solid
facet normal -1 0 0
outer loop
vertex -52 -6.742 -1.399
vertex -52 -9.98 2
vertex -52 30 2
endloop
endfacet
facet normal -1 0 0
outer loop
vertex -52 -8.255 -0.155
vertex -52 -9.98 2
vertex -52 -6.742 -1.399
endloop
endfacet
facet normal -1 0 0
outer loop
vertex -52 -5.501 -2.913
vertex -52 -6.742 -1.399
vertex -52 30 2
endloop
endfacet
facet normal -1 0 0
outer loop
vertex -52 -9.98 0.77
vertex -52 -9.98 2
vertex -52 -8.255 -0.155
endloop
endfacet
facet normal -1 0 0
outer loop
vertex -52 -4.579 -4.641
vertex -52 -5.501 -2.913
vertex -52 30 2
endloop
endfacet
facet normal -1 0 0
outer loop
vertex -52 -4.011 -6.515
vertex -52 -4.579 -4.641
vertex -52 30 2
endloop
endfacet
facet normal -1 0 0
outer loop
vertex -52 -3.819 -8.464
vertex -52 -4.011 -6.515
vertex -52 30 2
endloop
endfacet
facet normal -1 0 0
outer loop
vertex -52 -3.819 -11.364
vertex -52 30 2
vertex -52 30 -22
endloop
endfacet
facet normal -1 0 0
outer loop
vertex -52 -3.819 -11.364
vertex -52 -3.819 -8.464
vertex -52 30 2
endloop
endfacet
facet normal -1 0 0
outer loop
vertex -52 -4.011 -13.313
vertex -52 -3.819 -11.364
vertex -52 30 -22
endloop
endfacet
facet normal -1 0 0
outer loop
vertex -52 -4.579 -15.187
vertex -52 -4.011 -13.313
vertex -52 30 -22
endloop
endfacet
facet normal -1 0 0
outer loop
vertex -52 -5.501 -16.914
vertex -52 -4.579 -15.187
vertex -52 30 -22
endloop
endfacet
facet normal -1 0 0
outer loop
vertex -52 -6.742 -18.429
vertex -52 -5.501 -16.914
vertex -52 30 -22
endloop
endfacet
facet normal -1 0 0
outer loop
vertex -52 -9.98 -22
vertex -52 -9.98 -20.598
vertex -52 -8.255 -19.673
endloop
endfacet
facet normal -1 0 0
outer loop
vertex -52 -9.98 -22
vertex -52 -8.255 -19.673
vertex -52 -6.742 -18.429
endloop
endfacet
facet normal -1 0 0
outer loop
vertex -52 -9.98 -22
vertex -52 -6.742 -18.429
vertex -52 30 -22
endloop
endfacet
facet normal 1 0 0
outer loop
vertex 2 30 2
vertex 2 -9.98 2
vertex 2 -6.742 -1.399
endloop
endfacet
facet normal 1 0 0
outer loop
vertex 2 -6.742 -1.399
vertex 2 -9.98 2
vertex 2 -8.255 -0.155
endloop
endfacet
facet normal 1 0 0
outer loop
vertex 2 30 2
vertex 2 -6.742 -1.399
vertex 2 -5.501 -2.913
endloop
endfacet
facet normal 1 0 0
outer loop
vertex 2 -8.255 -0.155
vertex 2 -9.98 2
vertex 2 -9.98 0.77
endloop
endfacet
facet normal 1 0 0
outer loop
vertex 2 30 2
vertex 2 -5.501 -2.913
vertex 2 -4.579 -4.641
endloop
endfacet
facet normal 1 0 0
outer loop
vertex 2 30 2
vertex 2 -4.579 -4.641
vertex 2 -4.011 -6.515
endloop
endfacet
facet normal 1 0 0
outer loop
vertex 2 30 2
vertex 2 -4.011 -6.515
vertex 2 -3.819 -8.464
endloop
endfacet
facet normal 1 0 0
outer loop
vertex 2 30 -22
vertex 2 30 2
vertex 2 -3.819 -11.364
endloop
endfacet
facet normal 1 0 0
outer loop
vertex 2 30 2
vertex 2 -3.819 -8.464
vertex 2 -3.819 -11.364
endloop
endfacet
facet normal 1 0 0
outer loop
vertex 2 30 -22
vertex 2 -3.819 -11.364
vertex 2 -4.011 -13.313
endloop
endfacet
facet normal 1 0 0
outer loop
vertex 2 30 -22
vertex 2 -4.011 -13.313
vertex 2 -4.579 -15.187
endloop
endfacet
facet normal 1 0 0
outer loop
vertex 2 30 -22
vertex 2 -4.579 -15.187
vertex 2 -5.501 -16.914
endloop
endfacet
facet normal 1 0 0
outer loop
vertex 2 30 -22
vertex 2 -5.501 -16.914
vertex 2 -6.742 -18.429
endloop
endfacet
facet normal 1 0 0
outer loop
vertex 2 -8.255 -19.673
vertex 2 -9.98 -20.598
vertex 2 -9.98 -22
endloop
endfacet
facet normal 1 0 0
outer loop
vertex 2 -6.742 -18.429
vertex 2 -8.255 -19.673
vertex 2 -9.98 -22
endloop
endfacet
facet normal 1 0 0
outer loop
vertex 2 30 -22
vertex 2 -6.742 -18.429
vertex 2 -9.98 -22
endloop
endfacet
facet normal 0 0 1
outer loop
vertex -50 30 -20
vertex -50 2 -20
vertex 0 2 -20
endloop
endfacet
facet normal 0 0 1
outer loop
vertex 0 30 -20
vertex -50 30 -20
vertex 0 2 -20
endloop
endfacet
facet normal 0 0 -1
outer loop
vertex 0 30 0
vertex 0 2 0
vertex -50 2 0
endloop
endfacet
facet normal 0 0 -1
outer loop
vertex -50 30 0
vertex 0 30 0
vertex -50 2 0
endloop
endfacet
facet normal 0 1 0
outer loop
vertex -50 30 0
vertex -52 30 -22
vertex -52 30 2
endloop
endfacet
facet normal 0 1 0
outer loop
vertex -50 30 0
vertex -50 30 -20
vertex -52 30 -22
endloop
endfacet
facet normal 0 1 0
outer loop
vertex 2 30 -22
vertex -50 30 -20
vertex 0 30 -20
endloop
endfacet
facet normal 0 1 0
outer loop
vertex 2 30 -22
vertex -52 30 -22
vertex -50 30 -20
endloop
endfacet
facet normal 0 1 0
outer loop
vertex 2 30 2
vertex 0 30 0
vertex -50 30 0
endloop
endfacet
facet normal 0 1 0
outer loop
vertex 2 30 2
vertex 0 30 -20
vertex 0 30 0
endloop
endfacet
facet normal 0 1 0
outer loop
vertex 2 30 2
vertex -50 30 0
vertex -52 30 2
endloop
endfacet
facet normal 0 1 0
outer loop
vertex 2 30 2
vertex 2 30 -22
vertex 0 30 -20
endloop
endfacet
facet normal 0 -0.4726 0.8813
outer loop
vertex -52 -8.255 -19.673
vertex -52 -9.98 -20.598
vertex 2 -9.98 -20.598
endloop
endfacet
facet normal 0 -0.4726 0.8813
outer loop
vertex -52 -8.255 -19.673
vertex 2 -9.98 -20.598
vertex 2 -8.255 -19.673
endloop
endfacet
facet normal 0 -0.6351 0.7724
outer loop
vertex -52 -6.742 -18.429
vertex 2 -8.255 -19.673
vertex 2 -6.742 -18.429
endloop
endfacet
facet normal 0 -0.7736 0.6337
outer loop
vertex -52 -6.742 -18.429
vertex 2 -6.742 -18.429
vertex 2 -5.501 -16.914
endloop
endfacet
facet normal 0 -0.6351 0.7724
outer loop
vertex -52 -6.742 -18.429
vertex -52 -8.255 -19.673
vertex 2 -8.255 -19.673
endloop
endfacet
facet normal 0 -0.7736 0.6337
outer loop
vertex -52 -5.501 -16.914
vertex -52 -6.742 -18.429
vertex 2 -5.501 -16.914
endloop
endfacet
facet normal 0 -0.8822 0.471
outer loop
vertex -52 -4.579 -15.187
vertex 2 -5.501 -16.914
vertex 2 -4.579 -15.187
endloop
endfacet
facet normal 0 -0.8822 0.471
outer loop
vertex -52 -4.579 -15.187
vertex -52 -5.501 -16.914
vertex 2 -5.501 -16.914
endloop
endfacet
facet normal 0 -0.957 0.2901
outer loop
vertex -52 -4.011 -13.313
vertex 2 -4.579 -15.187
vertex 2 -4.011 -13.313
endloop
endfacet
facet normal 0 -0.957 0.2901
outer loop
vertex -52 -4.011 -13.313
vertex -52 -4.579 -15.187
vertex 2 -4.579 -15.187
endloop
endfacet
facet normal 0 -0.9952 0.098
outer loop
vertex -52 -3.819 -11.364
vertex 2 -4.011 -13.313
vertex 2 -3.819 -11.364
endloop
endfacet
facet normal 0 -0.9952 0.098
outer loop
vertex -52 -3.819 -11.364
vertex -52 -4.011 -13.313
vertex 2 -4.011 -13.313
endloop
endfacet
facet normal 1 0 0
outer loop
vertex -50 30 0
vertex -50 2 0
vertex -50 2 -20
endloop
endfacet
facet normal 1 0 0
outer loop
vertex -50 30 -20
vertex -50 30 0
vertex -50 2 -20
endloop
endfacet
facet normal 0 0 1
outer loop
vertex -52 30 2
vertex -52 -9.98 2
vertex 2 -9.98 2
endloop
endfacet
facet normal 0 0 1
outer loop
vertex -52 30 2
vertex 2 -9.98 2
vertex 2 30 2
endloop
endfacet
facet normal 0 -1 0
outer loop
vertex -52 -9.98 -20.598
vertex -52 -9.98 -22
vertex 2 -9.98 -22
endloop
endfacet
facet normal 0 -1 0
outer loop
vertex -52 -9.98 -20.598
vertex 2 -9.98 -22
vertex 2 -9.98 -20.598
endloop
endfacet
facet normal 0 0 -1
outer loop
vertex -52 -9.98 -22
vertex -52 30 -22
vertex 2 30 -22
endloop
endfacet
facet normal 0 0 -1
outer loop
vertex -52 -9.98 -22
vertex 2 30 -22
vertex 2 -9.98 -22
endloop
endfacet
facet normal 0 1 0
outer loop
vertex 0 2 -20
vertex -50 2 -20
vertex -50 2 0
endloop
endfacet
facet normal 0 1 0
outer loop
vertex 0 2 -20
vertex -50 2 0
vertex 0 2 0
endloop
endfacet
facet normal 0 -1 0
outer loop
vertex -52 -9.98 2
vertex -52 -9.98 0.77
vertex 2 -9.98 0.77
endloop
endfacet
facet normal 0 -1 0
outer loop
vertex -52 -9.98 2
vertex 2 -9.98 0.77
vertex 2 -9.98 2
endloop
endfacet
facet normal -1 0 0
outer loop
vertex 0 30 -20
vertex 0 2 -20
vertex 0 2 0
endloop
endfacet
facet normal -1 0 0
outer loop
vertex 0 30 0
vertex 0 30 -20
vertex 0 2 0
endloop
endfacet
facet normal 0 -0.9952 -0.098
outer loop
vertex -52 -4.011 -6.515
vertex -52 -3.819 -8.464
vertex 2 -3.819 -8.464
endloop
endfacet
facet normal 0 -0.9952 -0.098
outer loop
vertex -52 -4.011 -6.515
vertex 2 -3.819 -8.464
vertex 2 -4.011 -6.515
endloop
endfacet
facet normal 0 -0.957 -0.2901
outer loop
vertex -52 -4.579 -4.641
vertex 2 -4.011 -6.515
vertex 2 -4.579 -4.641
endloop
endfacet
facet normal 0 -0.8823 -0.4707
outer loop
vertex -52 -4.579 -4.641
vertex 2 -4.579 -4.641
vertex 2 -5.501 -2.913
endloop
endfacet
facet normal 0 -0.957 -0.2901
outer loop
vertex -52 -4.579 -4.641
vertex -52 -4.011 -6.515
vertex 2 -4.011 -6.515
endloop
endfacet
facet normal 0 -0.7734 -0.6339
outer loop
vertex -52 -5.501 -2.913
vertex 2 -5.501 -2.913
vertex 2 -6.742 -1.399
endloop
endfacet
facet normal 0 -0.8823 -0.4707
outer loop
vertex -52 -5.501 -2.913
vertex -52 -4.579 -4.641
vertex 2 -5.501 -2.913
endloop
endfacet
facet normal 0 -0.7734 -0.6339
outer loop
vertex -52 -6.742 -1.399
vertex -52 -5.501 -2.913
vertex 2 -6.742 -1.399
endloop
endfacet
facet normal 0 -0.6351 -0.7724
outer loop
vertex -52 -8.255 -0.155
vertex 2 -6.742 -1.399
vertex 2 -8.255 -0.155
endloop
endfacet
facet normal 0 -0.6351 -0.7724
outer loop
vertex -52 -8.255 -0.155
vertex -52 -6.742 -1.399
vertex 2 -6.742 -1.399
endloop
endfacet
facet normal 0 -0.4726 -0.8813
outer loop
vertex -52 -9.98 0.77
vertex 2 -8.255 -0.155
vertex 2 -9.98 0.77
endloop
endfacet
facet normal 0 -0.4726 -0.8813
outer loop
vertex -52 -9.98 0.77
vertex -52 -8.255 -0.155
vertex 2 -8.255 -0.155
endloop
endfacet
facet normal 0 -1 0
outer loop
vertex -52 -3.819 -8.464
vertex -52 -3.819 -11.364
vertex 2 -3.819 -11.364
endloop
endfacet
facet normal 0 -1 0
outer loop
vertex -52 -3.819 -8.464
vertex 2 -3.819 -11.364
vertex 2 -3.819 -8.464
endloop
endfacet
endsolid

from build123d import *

# Parameters (mm, degrees)
SURFACE_EXTRUSION1_1_DEPTH = 30
EPAISSIR1_T1               = 2
EPAISSIR2_OUTLINE_W        = 50
EPAISSIR2_OUTLINE_H        = 20
EPAISSIR2_DEPTH            = 2
BOSS_EXTRU_1_DEPTH         = 54
CONG_1_R                   = 10


# Read off the part's stored shape, not the designer's step: Epaissir2
with BuildPart() as body_1:
    # Surface-Extrusion1: a surface, the sketch's curves swept straight by 30 mm
    with BuildLine(Plane(origin=(0, 0, 0), x_dir=(1, 0, 0), z_dir=(0, 1, 0)), mode=Mode.PRIVATE) as surface_extrusion1_1_path:
        Line((0, 0), (-50, 0))
        Line((-50, 0), (-50, 20))
        Line((-50, 20), (0, 20))
        Line((0, 20), (0, 0))
    surface_extrusion1_1 = Shell.extrude(surface_extrusion1_1_path.wire(), (0 * SURFACE_EXTRUSION1_1_DEPTH, 1 * SURFACE_EXTRUSION1_1_DEPTH, 0 * SURFACE_EXTRUSION1_1_DEPTH))
    add(Solid.thicken(surface_extrusion1_1, EPAISSIR1_T1))

    # Epaissir2 outline → Epaissir2 (add)
    with BuildSketch(Plane(origin=(0, 0, 0), x_dir=(1, 0, 0), z_dir=(0, 1, 0))):
        with Locations((-25, 10)):
            Rectangle(EPAISSIR2_OUTLINE_W, EPAISSIR2_OUTLINE_H)
    extrude(amount=EPAISSIR2_DEPTH)

    # Esquisse3 → Boss.-Extru.1 (add)
    with BuildSketch(Plane.ZY.offset(52)):
        Polygon((-22, 0), (-22, -9.980445305), (-20.597715591, -9.980445305), (-20.597715591, -3.819178115), (0.770065176, -3.819178115), (0.770065176, -9.980445305), (2, -9.980445305), (2, 0), align=None)
    extrude(amount=-BOSS_EXTRU_1_DEPTH)

    # Congé1
    # the kernel refuses this fillet: 10 mm, written as the material it adds along each edge
    with BuildSketch(Plane(origin=(-52, -3.819178115, 0.770065176), x_dir=(0, -1, 0), z_dir=(1, 0, 0))) as cong_1_piece_1:
        with BuildLine():
            CenterArc((10, 9.233857829), CONG_1_R, 180, 67.426190035)
            Line((0, 9.233857829), (-0.2, 9.233857829))
            Line((-0.2, 9.233857829), (-0.2, 0))
            Line((-0.2, 0), (0, -0.2))
            ThreePointArc((0, -0.2), (3.080633595, -0.2), (6.084492534, -0.184677157))
            Line((6.084492534, -0.184677157), (6.16126719, 0))
        make_face()
    extrude(amount=54)
    with BuildSketch(Plane(origin=(-52, -3.819178115, -20.597715591), x_dir=(0, 0, 1), z_dir=(1, 0, 0))) as cong_1_piece_2:
        with BuildLine():
            CenterArc((9.233857829, 10), CONG_1_R, 202.573809965, 67.426190035)
            Line((0, 6.16126719), (-0.184677157, 6.084492534))
            ThreePointArc((-0.184677157, 6.084492534), (-0.2, 3.080633595), (-0.2, 0))
            Line((-0.2, 0), (0, -0.2))
            Line((0, -0.2), (9.233857829, -0.2))
            Line((9.233857829, -0.2), (9.233857829, 0))
        make_face()
    extrude(amount=54)


solid = body_1.part
